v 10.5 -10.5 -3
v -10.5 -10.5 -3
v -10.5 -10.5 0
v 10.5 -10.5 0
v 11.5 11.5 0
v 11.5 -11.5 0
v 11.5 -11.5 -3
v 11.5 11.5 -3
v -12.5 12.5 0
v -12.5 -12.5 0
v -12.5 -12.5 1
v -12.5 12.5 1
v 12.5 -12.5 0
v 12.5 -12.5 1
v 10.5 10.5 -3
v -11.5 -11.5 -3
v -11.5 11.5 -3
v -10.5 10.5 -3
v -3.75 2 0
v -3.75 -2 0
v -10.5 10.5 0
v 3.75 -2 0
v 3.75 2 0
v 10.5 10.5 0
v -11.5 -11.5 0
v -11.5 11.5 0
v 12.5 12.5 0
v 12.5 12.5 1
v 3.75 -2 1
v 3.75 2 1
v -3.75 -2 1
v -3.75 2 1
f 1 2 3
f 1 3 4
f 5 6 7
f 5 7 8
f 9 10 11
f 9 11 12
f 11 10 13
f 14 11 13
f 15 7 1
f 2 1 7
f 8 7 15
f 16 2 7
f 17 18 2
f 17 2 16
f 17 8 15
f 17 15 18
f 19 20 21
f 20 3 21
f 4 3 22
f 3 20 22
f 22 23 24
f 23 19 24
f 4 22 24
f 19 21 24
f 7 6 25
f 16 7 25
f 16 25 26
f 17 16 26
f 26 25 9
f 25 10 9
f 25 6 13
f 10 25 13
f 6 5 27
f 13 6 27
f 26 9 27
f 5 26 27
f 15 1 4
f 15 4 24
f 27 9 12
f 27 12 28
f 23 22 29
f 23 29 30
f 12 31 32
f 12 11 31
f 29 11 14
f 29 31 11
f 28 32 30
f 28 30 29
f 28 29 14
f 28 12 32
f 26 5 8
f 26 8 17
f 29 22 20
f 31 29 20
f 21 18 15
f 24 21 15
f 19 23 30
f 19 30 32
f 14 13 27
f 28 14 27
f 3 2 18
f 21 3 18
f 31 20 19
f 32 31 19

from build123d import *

# Parameters (mm, degrees)
SKETCH1_W           = 25
SKETCH1_H           = 25
BOSS_EXTRUDE1_DEPTH = 1
SKETCH2_W           = 23
SKETCH2_H           = 23
BOSS_EXTRUDE2_DEPTH = 3
SHELL1_START        = -3
SHELL1_OUTLINE_W    = 21
SHELL1_OUTLINE_H    = 21
SHELL1_DEPTH        = 3
SKETCH3_W           = 7.5
SKETCH3_H           = 4
CUT_EXTRUDE1_DEPTH  = 10


# Read off the part's stored shape, not the designer's step: Shell1
with BuildPart() as part:
    # Sketch1 → Boss-Extrude1 (new body)
    with BuildSketch(Plane.XY):
        Rectangle(SKETCH1_W, SKETCH1_H)
    extrude(amount=BOSS_EXTRUDE1_DEPTH)

    # Sketch2 → Boss-Extrude2 (add)
    with BuildSketch(Plane(origin=(0, 0, 0), x_dir=(-1, 0, 0), z_dir=(0, 0, -1))):
        Rectangle(SKETCH2_W, SKETCH2_H)
    extrude(amount=BOSS_EXTRUDE2_DEPTH)

    # Shell1 outline → Shell1 (cut)
    with BuildSketch(Plane.XY.offset(SHELL1_START)):
        Rectangle(SHELL1_OUTLINE_W, SHELL1_OUTLINE_H)
    extrude(amount=SHELL1_DEPTH, mode=Mode.SUBTRACT)

    # Sketch3 → Cut-Extrude1 (cut)
    with BuildSketch(Plane(origin=(0, 0, 0), x_dir=(-1, 0, 0), z_dir=(0, 0, -1))):
        Rectangle(SKETCH3_W, SKETCH3_H)
    extrude(amount=-CUT_EXTRUDE1_DEPTH, mode=Mode.SUBTRACT)


solid = part.part
